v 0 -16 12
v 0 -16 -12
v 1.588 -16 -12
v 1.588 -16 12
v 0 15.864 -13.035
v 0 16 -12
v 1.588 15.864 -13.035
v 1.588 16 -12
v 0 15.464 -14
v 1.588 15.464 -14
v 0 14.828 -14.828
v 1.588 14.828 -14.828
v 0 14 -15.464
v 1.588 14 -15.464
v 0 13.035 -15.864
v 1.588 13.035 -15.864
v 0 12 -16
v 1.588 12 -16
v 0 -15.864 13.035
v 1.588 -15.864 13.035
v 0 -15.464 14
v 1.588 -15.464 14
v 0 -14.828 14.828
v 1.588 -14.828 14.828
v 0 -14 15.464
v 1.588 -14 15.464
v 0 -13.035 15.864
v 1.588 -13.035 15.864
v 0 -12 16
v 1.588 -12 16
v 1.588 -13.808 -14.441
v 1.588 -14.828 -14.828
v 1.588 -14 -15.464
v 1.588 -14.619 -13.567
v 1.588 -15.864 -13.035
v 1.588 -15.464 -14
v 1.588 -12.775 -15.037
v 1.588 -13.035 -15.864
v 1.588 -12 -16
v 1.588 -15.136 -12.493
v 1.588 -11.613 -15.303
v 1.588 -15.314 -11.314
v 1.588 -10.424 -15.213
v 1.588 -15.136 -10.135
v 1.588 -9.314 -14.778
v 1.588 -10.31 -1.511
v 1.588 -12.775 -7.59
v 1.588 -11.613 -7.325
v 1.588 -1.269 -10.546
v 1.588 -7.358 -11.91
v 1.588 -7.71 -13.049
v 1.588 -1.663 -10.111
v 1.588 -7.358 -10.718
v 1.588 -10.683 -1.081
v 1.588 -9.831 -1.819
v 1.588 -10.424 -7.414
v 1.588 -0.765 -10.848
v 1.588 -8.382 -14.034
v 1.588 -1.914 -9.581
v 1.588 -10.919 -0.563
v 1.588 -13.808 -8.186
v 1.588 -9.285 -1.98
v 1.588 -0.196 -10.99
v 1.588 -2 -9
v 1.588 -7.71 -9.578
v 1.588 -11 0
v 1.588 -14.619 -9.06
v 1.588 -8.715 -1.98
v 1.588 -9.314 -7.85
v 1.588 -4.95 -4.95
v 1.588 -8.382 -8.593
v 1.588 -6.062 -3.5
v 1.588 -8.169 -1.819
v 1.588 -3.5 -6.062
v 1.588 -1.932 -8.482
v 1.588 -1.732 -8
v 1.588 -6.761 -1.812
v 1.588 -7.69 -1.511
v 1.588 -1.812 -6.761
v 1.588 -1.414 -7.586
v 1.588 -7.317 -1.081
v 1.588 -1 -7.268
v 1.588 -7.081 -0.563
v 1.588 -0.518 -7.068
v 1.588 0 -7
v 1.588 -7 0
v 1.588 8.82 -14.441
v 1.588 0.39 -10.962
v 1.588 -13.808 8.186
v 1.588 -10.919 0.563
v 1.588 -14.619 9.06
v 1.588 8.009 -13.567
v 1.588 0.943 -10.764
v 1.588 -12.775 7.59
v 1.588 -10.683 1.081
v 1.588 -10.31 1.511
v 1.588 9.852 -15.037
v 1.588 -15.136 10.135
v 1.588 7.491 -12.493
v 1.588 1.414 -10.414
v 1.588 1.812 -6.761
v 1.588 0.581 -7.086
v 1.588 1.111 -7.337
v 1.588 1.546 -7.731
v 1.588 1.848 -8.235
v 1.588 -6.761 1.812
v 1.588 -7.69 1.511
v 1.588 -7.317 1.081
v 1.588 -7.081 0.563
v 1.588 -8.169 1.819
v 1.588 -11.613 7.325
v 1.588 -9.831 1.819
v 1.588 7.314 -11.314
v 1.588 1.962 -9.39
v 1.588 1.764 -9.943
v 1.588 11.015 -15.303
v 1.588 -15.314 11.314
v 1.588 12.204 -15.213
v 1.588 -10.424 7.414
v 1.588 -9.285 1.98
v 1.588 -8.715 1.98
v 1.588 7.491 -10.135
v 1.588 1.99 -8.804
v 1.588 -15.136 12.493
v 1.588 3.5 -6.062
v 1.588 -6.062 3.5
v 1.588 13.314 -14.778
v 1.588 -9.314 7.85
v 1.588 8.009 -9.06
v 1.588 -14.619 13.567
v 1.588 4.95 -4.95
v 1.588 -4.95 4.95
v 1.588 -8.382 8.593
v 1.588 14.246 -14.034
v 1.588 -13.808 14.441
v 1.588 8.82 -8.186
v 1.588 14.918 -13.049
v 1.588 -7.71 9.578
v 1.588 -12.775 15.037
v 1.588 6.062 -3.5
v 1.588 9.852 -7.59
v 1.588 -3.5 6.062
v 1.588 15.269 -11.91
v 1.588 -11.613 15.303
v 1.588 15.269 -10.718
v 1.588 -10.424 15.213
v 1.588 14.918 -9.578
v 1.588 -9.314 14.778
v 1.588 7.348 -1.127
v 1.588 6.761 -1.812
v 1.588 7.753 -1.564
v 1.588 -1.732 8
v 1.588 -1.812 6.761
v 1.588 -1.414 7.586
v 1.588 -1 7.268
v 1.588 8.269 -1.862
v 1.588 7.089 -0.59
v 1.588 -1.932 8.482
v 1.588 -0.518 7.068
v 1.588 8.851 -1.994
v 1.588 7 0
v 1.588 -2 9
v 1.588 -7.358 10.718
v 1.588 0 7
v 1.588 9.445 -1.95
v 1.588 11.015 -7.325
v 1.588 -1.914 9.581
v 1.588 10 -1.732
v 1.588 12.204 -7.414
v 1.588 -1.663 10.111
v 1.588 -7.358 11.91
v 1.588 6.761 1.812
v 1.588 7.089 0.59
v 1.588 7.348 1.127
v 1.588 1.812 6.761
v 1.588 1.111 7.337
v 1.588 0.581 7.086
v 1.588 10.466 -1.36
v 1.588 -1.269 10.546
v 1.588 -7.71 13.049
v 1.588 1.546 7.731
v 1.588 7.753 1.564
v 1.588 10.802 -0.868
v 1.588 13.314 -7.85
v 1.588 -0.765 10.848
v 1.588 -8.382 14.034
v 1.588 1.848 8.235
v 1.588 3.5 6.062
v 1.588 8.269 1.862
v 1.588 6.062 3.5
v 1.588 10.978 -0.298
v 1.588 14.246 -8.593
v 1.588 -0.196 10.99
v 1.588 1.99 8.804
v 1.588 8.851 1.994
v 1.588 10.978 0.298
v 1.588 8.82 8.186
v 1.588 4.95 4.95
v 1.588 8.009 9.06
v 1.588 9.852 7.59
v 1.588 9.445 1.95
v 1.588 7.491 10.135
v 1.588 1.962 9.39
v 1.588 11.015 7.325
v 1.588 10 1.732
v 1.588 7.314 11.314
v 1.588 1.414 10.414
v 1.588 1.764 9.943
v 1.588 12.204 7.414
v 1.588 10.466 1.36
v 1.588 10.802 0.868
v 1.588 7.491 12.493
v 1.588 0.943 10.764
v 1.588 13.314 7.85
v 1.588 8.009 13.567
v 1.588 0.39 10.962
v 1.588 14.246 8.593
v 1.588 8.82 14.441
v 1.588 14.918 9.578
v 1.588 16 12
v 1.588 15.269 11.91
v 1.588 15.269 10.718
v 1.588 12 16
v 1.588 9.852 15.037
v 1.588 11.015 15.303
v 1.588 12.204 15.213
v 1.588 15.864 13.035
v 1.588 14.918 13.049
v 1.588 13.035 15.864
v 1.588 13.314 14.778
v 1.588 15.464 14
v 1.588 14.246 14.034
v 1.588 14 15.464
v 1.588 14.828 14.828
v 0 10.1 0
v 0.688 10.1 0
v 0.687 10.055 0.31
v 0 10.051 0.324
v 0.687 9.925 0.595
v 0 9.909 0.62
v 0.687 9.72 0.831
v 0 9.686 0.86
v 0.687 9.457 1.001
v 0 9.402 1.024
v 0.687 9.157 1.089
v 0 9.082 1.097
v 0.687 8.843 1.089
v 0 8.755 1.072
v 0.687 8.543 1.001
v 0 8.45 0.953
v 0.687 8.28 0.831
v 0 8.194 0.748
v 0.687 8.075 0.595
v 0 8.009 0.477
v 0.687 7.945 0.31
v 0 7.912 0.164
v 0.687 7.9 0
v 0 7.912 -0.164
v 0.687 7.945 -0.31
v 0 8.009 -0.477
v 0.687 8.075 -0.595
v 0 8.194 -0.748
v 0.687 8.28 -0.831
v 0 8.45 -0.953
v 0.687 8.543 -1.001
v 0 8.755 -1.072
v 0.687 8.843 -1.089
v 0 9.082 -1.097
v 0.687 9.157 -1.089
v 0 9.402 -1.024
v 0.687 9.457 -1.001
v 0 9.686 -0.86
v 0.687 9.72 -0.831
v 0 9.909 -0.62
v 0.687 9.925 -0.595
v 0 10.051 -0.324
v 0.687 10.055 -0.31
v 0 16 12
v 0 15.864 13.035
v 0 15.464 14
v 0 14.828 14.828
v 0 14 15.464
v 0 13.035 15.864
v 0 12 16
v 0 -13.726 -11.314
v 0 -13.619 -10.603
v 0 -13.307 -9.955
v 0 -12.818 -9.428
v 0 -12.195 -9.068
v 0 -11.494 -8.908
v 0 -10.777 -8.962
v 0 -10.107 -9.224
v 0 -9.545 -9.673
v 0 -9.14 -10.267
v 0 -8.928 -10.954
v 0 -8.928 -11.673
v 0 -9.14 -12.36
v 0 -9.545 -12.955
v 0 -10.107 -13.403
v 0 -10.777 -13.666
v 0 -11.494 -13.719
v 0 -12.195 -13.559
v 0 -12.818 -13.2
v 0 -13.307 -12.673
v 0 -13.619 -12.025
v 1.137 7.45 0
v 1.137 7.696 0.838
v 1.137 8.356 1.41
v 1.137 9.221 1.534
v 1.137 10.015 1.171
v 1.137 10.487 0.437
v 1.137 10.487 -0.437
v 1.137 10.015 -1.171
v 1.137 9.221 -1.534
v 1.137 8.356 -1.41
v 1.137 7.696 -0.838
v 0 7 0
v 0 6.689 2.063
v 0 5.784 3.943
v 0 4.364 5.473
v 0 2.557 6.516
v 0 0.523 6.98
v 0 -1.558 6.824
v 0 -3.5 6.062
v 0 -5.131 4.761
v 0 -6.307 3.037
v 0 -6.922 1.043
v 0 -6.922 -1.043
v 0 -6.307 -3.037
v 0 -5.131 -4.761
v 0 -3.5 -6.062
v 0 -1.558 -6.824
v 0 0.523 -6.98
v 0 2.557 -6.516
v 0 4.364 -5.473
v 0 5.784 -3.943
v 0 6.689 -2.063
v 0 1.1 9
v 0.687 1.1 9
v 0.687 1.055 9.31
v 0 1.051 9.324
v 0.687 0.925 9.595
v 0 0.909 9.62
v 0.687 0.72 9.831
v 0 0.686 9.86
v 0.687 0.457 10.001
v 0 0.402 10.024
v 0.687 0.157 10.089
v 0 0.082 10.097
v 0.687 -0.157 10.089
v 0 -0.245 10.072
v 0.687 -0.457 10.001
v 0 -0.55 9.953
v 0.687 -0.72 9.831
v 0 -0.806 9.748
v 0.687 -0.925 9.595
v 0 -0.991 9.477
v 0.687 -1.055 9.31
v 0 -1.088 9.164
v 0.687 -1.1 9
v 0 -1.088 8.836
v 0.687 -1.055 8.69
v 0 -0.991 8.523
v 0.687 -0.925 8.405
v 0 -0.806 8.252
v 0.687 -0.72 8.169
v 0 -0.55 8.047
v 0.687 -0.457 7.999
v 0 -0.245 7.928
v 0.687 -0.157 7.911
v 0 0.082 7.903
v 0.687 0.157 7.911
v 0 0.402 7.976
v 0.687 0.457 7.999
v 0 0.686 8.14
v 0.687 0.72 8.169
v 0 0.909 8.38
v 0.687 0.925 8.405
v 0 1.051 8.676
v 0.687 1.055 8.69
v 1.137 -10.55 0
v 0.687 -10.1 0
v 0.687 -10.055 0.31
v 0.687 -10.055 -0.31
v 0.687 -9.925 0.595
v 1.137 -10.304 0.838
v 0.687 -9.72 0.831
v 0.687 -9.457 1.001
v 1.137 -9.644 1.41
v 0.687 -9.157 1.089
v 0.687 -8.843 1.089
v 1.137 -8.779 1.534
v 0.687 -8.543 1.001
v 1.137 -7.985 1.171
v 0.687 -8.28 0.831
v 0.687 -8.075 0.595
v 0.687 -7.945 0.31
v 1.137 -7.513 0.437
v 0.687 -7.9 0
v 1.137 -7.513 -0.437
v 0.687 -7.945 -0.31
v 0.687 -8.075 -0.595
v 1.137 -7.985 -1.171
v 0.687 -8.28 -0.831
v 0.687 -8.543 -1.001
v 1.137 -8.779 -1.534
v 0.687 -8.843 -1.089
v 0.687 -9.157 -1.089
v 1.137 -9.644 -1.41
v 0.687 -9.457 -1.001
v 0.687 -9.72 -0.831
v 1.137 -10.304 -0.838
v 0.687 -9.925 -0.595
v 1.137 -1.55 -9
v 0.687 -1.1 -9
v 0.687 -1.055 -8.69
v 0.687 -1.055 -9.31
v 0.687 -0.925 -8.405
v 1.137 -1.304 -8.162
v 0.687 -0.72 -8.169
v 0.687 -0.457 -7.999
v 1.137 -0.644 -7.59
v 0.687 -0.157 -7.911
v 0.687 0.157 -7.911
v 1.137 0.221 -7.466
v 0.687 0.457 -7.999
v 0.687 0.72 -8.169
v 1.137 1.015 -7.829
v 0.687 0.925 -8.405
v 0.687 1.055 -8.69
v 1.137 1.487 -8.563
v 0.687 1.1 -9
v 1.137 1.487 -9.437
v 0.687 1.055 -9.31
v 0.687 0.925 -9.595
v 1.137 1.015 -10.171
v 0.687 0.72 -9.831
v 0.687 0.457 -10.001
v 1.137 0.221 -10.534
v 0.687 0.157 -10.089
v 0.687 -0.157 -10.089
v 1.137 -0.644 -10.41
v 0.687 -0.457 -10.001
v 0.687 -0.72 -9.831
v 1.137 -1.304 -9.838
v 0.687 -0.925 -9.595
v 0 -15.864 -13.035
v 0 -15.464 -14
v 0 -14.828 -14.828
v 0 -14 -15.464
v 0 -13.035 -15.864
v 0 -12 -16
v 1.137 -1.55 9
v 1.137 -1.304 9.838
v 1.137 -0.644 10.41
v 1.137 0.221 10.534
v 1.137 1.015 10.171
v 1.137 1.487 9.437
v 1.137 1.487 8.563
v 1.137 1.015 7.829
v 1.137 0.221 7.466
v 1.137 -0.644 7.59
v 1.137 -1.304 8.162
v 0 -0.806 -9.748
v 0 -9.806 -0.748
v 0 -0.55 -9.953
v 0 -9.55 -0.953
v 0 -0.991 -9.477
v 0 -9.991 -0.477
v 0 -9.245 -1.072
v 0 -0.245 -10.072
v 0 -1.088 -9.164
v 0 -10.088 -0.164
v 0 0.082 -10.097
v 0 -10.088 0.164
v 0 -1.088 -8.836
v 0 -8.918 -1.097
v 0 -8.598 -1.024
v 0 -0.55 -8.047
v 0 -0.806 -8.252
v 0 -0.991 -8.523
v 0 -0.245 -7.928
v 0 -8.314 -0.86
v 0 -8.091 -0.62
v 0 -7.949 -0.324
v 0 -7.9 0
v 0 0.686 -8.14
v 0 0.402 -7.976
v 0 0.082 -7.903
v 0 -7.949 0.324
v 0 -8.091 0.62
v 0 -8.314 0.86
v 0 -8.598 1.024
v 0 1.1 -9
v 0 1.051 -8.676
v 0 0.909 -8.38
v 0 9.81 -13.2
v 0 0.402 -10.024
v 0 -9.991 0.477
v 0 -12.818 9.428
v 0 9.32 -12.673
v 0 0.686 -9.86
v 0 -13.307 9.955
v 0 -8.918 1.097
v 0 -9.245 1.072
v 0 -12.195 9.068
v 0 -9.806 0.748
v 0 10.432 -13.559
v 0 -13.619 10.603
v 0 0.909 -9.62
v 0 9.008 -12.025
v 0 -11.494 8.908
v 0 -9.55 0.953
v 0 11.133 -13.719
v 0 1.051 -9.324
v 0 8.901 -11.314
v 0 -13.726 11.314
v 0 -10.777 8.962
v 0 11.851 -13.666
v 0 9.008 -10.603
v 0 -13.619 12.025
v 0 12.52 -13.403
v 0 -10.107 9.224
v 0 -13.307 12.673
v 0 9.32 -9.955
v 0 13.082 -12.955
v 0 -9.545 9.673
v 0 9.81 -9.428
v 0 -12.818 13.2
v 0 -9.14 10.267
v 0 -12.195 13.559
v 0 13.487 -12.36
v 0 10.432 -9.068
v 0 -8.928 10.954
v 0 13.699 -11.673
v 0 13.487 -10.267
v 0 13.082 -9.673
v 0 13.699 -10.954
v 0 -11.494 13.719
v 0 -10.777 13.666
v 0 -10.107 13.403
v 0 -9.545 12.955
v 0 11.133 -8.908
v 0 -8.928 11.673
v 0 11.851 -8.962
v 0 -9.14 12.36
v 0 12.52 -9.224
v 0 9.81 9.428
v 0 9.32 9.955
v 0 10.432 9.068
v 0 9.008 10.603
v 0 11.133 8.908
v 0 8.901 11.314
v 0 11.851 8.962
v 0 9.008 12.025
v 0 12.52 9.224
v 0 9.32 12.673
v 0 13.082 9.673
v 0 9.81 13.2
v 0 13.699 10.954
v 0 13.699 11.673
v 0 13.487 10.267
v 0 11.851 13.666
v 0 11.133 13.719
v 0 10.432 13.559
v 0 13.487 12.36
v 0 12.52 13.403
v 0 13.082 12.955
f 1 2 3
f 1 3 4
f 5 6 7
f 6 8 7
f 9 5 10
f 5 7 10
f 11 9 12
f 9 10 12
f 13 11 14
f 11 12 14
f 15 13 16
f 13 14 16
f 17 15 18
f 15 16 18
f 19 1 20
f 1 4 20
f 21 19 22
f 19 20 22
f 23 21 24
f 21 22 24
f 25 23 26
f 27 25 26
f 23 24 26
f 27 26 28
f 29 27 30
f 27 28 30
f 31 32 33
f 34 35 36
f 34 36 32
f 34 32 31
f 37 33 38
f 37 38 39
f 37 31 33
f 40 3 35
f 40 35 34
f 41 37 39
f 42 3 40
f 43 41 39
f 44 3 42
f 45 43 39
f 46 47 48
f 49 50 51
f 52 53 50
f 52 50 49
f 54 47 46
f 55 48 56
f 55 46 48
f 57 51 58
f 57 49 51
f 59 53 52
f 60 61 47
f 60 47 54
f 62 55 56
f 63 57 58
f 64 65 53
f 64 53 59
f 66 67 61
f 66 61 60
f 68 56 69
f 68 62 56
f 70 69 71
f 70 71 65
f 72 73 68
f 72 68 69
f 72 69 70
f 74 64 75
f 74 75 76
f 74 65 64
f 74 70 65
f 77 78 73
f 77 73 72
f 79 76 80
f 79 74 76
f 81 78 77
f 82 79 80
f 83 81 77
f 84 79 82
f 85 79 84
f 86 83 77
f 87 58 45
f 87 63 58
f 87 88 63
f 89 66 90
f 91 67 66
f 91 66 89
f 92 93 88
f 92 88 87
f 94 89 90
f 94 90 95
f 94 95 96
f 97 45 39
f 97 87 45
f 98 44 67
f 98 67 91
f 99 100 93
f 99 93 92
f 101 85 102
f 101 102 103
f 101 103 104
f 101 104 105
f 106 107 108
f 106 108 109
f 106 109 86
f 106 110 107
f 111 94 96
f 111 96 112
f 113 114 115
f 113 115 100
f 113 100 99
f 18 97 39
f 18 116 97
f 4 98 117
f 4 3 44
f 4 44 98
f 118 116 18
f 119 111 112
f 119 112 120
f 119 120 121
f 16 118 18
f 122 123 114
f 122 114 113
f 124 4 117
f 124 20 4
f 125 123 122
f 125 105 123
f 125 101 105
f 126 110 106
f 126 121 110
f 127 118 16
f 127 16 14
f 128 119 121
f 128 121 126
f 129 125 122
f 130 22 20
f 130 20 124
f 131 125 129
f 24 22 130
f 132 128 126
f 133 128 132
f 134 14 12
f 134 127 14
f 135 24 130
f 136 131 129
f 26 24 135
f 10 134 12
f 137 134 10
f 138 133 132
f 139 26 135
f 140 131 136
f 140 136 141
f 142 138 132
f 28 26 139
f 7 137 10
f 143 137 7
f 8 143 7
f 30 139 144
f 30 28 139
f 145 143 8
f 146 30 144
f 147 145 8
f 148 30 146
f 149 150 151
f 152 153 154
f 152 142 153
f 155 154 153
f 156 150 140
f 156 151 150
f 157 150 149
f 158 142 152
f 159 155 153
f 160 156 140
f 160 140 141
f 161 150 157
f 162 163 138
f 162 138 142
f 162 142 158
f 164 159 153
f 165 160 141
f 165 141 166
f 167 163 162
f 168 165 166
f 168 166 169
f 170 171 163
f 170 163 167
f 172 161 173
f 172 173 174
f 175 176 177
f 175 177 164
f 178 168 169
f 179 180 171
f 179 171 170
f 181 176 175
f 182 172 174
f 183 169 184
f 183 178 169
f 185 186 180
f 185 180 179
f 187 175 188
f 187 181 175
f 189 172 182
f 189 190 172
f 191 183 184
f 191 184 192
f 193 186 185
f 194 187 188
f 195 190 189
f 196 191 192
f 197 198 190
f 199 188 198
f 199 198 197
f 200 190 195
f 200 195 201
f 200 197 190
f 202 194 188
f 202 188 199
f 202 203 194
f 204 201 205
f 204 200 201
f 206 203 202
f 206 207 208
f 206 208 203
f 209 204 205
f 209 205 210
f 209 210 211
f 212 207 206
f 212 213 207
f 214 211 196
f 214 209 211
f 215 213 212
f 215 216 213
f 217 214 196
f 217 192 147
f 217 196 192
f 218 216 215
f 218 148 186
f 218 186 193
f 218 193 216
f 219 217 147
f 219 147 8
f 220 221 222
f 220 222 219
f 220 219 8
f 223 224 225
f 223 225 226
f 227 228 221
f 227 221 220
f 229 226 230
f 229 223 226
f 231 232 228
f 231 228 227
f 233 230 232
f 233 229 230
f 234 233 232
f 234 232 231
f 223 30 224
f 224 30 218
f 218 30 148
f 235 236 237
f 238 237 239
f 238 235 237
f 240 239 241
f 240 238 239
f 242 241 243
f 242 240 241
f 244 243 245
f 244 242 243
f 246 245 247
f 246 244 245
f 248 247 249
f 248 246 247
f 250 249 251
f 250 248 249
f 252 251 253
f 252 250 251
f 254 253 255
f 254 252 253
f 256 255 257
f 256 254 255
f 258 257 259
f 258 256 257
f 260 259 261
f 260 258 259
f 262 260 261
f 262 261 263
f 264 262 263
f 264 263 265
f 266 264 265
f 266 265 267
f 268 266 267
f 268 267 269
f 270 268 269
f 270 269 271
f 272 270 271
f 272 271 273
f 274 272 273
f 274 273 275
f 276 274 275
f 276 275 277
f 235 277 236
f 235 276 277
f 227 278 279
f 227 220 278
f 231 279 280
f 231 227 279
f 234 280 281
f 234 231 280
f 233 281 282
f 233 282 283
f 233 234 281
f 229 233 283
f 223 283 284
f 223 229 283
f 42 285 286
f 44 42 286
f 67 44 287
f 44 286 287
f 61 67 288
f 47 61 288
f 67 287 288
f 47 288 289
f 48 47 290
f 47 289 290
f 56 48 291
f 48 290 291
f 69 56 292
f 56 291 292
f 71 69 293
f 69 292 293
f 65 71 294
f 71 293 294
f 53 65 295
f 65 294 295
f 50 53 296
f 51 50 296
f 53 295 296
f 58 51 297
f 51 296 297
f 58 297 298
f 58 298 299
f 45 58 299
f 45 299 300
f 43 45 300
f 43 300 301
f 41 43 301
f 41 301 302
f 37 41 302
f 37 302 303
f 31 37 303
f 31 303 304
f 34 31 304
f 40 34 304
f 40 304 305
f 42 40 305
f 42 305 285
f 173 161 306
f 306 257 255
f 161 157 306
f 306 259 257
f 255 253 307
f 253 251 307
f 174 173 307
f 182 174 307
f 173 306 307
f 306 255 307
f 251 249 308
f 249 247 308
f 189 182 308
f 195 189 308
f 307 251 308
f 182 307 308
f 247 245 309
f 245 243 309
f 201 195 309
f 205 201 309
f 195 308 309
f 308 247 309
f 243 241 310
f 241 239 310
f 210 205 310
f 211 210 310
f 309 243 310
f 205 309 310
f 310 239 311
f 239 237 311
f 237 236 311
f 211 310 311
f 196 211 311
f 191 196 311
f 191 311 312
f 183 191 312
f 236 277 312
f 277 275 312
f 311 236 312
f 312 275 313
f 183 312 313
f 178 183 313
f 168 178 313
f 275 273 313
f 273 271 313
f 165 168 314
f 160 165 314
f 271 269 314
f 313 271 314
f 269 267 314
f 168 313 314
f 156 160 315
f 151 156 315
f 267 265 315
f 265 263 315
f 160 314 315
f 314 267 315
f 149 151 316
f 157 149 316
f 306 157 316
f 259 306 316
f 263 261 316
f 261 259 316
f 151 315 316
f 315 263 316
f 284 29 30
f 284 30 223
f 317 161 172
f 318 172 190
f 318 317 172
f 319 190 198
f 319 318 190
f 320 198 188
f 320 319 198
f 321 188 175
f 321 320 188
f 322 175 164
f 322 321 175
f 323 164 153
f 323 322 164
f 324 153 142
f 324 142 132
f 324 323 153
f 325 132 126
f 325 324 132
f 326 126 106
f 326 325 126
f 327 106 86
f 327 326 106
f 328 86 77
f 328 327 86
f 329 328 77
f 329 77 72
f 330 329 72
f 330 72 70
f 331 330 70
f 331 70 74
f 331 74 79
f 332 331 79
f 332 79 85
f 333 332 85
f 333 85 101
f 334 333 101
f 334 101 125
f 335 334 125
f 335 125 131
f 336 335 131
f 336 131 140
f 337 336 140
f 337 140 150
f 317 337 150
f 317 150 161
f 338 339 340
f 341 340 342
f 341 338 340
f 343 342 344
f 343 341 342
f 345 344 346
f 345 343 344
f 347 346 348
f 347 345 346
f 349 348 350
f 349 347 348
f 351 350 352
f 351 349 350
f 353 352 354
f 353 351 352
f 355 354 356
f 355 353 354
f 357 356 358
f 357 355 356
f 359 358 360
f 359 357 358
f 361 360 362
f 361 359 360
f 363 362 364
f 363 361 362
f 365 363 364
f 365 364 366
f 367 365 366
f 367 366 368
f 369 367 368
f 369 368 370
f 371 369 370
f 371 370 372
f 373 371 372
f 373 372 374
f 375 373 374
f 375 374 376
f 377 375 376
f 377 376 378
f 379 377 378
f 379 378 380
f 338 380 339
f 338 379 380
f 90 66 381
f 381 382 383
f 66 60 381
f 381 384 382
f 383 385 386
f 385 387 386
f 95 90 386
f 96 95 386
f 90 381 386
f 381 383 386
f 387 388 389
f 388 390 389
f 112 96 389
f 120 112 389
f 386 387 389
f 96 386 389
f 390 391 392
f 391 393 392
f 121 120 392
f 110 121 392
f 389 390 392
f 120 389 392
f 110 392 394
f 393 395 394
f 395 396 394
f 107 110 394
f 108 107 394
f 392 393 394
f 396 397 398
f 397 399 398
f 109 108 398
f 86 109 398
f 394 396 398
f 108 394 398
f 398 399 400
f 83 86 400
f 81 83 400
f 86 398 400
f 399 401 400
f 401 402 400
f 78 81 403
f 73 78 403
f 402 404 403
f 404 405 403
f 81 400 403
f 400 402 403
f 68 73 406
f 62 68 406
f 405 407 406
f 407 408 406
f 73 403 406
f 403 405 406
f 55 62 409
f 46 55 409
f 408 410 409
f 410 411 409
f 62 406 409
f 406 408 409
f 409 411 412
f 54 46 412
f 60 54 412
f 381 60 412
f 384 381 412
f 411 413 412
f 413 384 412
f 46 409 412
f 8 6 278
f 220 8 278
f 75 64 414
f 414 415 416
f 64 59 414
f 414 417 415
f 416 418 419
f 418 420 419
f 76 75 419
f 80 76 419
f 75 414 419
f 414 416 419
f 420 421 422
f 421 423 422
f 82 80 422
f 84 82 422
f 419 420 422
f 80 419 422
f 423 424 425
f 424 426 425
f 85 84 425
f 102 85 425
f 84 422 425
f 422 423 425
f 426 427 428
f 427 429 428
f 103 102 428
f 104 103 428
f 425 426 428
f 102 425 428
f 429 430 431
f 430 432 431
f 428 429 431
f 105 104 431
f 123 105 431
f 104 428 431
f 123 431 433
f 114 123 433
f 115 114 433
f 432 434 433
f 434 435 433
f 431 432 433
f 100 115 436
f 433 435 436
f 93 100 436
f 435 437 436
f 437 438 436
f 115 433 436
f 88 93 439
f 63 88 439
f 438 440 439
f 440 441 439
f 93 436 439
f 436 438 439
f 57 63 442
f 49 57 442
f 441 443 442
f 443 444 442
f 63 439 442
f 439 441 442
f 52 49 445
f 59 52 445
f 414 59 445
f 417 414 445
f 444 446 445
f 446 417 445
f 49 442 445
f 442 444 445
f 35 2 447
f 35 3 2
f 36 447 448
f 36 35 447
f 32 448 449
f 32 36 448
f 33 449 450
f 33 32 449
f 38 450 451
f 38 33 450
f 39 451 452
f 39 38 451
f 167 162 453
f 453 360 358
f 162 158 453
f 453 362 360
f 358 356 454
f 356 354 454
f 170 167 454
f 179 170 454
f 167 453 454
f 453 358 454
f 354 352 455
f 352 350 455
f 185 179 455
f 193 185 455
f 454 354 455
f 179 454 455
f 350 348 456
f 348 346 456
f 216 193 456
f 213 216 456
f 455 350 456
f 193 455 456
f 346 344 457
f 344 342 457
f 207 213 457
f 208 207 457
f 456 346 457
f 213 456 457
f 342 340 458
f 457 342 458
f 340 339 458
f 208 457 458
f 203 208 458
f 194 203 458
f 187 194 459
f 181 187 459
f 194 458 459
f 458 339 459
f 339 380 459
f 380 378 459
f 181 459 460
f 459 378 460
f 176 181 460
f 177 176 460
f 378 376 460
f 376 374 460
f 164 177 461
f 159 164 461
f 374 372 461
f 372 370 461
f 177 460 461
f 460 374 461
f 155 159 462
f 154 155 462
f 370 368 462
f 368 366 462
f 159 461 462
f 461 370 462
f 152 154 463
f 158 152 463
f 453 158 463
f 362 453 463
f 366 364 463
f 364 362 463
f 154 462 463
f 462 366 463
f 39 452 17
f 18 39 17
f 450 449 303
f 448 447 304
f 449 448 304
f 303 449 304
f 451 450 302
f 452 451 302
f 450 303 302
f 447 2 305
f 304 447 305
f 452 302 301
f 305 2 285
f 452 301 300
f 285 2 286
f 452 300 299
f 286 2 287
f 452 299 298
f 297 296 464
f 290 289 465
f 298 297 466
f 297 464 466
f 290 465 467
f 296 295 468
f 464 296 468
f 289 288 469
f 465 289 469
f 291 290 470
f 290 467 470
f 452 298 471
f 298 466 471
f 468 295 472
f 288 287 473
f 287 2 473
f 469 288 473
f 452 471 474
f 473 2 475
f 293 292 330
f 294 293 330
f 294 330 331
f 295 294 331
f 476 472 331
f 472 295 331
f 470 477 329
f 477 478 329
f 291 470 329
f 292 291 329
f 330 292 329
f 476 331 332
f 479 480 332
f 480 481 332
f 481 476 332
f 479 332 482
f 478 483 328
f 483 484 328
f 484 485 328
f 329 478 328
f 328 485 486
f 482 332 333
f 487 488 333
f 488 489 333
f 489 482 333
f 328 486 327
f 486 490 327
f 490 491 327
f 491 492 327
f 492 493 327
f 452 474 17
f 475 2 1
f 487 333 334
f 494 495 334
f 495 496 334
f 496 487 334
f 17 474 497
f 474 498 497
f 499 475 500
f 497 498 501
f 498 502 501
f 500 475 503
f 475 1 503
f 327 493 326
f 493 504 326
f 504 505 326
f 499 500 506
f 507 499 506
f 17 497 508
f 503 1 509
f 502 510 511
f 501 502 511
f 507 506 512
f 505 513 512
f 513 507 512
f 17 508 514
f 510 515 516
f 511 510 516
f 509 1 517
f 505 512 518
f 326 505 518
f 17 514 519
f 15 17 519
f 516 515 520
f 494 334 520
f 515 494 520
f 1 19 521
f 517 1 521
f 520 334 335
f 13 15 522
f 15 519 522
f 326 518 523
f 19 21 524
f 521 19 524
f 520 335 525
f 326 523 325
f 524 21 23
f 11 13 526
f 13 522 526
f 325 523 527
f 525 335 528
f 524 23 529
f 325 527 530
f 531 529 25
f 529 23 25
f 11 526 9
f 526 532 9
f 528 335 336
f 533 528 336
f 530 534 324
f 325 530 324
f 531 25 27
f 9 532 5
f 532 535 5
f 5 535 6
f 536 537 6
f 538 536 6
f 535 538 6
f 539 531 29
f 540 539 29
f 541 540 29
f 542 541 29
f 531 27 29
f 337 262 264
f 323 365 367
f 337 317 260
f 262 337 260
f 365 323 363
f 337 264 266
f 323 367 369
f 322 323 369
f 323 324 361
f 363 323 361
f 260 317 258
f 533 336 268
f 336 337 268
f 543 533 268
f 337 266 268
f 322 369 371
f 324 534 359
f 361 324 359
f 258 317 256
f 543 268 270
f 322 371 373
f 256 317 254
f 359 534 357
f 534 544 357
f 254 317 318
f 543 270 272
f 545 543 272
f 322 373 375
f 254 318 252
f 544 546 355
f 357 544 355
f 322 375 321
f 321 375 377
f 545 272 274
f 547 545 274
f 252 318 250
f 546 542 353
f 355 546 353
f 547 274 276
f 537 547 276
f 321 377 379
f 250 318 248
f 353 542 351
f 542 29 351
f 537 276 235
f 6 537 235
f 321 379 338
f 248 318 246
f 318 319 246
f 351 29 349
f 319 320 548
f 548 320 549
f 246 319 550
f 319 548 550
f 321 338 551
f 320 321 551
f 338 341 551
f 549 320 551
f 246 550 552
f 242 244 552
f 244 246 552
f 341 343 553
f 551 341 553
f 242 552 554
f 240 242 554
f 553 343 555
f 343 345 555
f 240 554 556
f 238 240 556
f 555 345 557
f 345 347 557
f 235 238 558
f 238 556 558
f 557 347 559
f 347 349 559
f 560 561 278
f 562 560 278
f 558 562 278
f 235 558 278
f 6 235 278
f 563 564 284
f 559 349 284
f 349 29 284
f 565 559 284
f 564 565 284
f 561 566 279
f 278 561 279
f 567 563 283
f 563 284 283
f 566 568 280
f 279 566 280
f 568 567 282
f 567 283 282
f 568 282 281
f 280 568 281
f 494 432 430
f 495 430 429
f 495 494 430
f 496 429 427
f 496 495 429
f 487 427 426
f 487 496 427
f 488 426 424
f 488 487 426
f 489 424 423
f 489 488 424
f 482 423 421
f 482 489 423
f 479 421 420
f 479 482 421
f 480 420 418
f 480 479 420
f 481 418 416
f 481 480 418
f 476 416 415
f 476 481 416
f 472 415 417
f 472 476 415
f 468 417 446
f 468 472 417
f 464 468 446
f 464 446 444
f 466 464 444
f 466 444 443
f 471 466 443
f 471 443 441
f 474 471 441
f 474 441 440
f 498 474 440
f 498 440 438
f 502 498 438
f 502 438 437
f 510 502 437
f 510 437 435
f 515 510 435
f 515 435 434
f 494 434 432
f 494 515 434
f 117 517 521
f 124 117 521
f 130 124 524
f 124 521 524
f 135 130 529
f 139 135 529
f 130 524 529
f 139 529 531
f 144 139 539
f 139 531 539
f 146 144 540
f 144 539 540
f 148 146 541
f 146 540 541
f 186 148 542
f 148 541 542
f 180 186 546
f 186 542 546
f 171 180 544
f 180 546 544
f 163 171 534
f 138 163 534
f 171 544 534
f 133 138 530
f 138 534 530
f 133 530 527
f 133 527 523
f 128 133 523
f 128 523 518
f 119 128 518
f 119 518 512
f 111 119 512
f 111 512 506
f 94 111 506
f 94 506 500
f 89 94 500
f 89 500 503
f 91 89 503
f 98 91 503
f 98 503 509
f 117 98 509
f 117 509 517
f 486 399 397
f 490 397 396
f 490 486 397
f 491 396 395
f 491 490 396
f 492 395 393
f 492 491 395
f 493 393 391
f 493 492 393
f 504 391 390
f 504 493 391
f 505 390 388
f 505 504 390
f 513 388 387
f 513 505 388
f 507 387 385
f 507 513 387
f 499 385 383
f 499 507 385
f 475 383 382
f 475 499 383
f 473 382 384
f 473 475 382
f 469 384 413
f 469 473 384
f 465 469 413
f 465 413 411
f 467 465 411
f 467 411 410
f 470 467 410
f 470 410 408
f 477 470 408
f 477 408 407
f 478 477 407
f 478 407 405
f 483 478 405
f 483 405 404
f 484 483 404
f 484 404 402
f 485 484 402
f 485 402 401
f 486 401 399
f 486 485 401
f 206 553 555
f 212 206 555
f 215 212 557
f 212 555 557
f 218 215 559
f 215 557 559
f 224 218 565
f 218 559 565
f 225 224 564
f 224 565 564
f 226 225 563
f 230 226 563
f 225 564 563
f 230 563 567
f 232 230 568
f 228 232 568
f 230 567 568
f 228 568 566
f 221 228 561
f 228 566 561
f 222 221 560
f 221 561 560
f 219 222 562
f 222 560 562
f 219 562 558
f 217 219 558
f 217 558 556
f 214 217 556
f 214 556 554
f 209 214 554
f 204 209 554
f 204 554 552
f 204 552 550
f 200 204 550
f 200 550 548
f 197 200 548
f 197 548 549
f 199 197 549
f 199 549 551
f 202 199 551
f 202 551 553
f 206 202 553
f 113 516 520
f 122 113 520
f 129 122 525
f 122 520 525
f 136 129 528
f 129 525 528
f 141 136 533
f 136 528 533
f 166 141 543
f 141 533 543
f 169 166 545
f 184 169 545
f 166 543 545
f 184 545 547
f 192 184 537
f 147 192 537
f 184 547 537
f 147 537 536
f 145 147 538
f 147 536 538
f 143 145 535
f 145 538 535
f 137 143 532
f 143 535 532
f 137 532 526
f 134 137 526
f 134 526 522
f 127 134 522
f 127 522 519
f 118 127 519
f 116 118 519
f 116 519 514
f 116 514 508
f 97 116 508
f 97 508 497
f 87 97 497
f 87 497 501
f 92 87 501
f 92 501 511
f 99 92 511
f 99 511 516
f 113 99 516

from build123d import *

# Parameters (mm, degrees)
F0_W           = 32
F0_H           = 32
F0_R           = 2
F0_R_2         = 1.1
F0_R_3         = 7
F1_DEPTH       = 1.5875
F3_D           = 4
F3_CSINK_D     = 8
F3_CSINK_ANGLE = 90
F4_D           = 2
F4_CSINK_D     = 4
F4_CSINK_ANGLE = 90
F5_R           = 4


with BuildPart() as f1:
    # F0 (on Right) → F1 (new body)
    with BuildSketch(Plane.YZ):
        Rectangle(F0_W, F0_H)
        with Locations((-11.313708, -11.313708)):
            Circle(F0_R, mode=Mode.SUBTRACT)
        with Locations((0, -9)):
            Circle(F0_R_2, mode=Mode.SUBTRACT)
        with Locations((11.313708, -11.313708)):
            Circle(F0_R, mode=Mode.SUBTRACT)
        with Locations((-9, 0)):
            Circle(F0_R_2, mode=Mode.SUBTRACT)
        with Locations((-11.313708, 11.313708)):
            Circle(F0_R, mode=Mode.SUBTRACT)
        Circle(F0_R_3, mode=Mode.SUBTRACT)
        with Locations((9, 0)):
            Circle(F0_R_2, mode=Mode.SUBTRACT)
        with Locations((0, 9)):
            Circle(F0_R_2, mode=Mode.SUBTRACT)
        with Locations((11.313708, 11.313708)):
            Circle(F0_R, mode=Mode.SUBTRACT)
    extrude(amount=F1_DEPTH)

    # F3 (through all)
    with Locations(Plane.YZ.offset(1.5875)):
        with Locations((-11.313708, 11.313708), (11.313708, 11.313708), (11.313708, -11.313708), (-11.313708, -11.313708)):
            CounterSinkHole(F3_D / 2, F3_CSINK_D / 2, counter_sink_angle=F3_CSINK_ANGLE)

    # F4 (through all)
    with Locations(Plane.YZ.offset(1.5875)):
        with Locations((-9, 0), (0, 9), (9, 0), (0, -9)):
            CounterSinkHole(F4_D / 2, F4_CSINK_D / 2, counter_sink_angle=F4_CSINK_ANGLE)

    # F5
    f5_edges = [f1.edges().sort_by_distance(p)[0] for p in [
        (0.79375, -16, 16),
        (0.79375, 16, 16),
        (0.79375, 16, -16),
        (0.79375, -16, -16),
    ]]
    fillet(f5_edges, radius=F5_R)


solid = f1.part
